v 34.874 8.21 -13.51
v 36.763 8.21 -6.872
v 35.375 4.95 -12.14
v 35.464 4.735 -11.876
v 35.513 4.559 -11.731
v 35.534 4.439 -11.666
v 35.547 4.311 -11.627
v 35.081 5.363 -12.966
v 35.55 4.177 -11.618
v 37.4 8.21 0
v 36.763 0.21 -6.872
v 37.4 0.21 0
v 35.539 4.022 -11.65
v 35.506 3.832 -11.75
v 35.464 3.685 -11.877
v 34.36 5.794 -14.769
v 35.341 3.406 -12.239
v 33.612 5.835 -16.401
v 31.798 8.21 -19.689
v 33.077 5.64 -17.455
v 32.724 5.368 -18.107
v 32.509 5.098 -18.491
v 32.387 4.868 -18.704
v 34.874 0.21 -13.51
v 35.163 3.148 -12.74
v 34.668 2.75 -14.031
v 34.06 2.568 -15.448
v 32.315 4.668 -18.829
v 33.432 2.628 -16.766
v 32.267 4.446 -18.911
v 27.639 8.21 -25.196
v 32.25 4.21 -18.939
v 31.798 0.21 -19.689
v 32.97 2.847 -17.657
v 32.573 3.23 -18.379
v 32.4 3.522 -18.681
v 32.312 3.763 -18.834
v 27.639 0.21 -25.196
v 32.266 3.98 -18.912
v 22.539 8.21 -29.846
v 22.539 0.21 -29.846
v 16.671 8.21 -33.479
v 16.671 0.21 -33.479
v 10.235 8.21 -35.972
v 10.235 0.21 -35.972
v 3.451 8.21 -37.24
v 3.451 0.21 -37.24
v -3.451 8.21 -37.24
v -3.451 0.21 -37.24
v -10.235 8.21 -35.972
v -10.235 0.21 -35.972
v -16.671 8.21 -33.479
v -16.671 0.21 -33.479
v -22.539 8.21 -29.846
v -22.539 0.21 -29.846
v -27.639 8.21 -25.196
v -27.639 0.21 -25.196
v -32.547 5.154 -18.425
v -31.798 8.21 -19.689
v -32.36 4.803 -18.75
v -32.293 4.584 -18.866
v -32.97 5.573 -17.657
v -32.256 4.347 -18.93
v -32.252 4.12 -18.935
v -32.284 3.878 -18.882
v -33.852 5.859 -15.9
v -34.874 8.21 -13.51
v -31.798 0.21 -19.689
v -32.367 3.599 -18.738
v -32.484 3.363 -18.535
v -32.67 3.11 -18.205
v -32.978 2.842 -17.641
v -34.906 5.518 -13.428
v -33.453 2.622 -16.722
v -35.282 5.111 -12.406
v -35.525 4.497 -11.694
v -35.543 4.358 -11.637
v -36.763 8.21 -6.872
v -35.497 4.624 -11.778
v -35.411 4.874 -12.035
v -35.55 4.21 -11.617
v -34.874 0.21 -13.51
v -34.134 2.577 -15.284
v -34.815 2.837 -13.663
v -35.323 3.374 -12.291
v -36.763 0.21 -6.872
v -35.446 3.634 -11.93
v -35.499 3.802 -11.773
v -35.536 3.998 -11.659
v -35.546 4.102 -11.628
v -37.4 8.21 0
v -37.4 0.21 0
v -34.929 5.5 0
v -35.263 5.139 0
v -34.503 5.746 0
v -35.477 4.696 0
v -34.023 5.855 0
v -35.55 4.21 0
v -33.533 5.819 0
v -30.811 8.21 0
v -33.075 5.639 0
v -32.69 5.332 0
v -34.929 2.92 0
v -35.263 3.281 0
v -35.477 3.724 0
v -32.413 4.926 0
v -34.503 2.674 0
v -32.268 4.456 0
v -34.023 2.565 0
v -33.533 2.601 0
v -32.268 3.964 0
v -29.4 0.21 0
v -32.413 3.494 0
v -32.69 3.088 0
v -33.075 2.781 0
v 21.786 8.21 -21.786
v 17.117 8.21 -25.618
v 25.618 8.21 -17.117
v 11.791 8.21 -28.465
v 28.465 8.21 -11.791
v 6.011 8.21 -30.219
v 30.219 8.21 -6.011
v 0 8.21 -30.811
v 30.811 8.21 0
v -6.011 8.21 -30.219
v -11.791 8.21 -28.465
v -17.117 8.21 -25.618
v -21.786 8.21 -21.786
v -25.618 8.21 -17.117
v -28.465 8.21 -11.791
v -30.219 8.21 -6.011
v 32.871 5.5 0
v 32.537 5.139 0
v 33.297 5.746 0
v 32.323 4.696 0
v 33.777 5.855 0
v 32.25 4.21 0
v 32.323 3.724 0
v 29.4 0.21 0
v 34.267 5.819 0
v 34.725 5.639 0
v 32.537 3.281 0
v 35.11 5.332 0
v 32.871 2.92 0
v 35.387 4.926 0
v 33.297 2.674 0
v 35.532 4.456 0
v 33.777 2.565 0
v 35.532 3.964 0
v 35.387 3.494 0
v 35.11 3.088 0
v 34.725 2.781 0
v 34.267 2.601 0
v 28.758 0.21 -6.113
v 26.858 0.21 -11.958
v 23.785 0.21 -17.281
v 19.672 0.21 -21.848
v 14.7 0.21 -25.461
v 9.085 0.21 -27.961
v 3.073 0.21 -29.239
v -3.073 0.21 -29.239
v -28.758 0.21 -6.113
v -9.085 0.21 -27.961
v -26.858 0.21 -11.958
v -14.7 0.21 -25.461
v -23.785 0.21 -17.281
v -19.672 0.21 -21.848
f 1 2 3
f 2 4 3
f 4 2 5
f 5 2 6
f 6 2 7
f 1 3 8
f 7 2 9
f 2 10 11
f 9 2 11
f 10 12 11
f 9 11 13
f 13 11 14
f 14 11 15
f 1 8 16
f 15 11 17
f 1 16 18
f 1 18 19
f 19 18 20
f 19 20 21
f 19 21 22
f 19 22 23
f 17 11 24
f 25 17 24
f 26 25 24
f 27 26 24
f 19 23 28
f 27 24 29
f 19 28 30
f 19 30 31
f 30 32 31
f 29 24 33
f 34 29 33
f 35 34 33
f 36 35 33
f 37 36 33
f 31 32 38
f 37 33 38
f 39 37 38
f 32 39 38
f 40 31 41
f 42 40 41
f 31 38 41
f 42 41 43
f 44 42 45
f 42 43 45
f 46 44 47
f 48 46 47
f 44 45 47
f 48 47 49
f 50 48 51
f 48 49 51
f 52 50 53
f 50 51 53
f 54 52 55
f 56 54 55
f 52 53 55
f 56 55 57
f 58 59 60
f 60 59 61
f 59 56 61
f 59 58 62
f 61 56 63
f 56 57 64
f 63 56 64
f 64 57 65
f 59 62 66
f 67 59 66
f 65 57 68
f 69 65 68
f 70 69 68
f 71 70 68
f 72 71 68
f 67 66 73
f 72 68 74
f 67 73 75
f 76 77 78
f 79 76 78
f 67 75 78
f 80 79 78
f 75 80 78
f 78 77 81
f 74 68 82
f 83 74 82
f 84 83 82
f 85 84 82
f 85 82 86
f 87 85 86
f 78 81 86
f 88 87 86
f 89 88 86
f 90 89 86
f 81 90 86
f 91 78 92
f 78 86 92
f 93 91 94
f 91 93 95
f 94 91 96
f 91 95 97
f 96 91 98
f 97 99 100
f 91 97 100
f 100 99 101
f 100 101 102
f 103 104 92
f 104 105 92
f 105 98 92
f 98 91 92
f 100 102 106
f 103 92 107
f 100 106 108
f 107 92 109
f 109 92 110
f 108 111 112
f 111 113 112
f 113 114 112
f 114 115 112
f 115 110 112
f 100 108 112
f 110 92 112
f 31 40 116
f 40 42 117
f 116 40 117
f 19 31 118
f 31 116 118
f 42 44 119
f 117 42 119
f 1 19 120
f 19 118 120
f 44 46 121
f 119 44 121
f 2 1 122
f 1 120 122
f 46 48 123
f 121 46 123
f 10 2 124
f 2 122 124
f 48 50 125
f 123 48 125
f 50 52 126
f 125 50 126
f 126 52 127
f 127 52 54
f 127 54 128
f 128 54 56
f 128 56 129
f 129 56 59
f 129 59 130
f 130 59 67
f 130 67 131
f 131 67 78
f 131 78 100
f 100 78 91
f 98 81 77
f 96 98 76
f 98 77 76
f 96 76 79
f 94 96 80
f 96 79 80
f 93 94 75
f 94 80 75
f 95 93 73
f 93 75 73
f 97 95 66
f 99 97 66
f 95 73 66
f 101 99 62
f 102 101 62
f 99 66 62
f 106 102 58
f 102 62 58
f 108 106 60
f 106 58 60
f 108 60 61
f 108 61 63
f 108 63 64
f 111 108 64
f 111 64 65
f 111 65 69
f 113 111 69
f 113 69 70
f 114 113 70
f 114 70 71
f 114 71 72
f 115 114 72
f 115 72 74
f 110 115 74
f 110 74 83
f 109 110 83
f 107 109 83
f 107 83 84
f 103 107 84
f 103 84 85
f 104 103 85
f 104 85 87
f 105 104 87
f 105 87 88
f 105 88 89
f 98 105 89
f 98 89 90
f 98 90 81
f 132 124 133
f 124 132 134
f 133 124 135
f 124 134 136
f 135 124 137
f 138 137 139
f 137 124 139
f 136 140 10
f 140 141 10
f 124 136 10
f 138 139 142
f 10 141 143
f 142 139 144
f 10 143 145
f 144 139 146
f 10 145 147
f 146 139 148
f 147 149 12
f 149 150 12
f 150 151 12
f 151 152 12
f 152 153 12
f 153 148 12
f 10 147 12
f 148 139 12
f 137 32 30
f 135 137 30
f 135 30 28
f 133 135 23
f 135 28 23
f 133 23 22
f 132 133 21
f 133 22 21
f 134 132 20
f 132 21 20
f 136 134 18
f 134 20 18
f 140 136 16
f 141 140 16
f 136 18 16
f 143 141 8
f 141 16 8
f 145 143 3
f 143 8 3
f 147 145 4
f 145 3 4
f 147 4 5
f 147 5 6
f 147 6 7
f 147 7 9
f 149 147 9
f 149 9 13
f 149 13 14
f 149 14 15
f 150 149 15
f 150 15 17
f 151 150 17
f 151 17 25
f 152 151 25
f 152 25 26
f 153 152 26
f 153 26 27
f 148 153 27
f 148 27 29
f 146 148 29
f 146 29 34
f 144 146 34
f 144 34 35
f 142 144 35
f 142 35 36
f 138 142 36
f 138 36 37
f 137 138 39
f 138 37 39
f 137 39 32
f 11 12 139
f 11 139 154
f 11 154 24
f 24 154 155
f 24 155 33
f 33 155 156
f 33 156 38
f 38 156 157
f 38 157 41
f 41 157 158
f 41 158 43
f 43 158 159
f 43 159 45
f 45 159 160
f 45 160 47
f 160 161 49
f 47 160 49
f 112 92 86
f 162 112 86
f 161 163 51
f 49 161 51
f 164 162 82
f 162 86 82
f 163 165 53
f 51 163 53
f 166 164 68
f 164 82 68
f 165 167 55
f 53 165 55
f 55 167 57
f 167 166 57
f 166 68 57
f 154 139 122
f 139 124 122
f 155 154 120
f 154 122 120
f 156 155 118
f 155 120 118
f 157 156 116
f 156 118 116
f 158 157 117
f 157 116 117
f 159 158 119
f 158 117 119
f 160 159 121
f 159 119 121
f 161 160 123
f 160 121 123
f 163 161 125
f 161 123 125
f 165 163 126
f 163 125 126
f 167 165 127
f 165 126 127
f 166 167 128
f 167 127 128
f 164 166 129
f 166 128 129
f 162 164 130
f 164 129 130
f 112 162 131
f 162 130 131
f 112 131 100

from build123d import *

# Parameters (mm, degrees)
CUT_EXTRUDE3_DEPTH      = 54.524985754
CUT_EXTRUDE3_DEPTH_BACK = 54.524985754
SKETCH5_W               = 145.272182815
SKETCH5_H               = 50.443132161
M4X0_7_TAPPED_HOLE2_D   = 3.3


with BuildPart() as part:
    # Sketch3 → Revolve1 (revolve)
    with BuildSketch(Plane.XY, mode=Mode.PRIVATE) as revolve1_sk:
        Polygon((-30.810615846, 8.21), (-37.4, 8.21), (-37.4, 0.21), (-29.4, 0.21), align=None)
    revolve(revolve1_sk.sketch.rotate(Axis((0, 0, 0), (0, 1, 0)), 270), axis=Axis((0, 0, 0), (0, 1, 0)))

    # Sketch5 → Cut-Extrude3 (cut, two sides: drawn at the far end of the back side and taken through both)
    with BuildSketch(Plane(origin=(0, 0, 0), x_dir=(1, 0, 0), z_dir=(0, 1, 0)).offset(-CUT_EXTRUDE3_DEPTH_BACK)):
        with Locations((35.236091407, -25.221566081)):
            Rectangle(SKETCH5_W, SKETCH5_H)
    extrude(amount=CUT_EXTRUDE3_DEPTH + CUT_EXTRUDE3_DEPTH_BACK, mode=Mode.SUBTRACT)

    # M4x0.7 Tapped Hole2 (through all)
    with Locations(Plane.XY):
        with Locations((-33.9, 4.21), (33.9, 4.21)):
            Hole(M4X0_7_TAPPED_HOLE2_D / 2)


solid = part.part
